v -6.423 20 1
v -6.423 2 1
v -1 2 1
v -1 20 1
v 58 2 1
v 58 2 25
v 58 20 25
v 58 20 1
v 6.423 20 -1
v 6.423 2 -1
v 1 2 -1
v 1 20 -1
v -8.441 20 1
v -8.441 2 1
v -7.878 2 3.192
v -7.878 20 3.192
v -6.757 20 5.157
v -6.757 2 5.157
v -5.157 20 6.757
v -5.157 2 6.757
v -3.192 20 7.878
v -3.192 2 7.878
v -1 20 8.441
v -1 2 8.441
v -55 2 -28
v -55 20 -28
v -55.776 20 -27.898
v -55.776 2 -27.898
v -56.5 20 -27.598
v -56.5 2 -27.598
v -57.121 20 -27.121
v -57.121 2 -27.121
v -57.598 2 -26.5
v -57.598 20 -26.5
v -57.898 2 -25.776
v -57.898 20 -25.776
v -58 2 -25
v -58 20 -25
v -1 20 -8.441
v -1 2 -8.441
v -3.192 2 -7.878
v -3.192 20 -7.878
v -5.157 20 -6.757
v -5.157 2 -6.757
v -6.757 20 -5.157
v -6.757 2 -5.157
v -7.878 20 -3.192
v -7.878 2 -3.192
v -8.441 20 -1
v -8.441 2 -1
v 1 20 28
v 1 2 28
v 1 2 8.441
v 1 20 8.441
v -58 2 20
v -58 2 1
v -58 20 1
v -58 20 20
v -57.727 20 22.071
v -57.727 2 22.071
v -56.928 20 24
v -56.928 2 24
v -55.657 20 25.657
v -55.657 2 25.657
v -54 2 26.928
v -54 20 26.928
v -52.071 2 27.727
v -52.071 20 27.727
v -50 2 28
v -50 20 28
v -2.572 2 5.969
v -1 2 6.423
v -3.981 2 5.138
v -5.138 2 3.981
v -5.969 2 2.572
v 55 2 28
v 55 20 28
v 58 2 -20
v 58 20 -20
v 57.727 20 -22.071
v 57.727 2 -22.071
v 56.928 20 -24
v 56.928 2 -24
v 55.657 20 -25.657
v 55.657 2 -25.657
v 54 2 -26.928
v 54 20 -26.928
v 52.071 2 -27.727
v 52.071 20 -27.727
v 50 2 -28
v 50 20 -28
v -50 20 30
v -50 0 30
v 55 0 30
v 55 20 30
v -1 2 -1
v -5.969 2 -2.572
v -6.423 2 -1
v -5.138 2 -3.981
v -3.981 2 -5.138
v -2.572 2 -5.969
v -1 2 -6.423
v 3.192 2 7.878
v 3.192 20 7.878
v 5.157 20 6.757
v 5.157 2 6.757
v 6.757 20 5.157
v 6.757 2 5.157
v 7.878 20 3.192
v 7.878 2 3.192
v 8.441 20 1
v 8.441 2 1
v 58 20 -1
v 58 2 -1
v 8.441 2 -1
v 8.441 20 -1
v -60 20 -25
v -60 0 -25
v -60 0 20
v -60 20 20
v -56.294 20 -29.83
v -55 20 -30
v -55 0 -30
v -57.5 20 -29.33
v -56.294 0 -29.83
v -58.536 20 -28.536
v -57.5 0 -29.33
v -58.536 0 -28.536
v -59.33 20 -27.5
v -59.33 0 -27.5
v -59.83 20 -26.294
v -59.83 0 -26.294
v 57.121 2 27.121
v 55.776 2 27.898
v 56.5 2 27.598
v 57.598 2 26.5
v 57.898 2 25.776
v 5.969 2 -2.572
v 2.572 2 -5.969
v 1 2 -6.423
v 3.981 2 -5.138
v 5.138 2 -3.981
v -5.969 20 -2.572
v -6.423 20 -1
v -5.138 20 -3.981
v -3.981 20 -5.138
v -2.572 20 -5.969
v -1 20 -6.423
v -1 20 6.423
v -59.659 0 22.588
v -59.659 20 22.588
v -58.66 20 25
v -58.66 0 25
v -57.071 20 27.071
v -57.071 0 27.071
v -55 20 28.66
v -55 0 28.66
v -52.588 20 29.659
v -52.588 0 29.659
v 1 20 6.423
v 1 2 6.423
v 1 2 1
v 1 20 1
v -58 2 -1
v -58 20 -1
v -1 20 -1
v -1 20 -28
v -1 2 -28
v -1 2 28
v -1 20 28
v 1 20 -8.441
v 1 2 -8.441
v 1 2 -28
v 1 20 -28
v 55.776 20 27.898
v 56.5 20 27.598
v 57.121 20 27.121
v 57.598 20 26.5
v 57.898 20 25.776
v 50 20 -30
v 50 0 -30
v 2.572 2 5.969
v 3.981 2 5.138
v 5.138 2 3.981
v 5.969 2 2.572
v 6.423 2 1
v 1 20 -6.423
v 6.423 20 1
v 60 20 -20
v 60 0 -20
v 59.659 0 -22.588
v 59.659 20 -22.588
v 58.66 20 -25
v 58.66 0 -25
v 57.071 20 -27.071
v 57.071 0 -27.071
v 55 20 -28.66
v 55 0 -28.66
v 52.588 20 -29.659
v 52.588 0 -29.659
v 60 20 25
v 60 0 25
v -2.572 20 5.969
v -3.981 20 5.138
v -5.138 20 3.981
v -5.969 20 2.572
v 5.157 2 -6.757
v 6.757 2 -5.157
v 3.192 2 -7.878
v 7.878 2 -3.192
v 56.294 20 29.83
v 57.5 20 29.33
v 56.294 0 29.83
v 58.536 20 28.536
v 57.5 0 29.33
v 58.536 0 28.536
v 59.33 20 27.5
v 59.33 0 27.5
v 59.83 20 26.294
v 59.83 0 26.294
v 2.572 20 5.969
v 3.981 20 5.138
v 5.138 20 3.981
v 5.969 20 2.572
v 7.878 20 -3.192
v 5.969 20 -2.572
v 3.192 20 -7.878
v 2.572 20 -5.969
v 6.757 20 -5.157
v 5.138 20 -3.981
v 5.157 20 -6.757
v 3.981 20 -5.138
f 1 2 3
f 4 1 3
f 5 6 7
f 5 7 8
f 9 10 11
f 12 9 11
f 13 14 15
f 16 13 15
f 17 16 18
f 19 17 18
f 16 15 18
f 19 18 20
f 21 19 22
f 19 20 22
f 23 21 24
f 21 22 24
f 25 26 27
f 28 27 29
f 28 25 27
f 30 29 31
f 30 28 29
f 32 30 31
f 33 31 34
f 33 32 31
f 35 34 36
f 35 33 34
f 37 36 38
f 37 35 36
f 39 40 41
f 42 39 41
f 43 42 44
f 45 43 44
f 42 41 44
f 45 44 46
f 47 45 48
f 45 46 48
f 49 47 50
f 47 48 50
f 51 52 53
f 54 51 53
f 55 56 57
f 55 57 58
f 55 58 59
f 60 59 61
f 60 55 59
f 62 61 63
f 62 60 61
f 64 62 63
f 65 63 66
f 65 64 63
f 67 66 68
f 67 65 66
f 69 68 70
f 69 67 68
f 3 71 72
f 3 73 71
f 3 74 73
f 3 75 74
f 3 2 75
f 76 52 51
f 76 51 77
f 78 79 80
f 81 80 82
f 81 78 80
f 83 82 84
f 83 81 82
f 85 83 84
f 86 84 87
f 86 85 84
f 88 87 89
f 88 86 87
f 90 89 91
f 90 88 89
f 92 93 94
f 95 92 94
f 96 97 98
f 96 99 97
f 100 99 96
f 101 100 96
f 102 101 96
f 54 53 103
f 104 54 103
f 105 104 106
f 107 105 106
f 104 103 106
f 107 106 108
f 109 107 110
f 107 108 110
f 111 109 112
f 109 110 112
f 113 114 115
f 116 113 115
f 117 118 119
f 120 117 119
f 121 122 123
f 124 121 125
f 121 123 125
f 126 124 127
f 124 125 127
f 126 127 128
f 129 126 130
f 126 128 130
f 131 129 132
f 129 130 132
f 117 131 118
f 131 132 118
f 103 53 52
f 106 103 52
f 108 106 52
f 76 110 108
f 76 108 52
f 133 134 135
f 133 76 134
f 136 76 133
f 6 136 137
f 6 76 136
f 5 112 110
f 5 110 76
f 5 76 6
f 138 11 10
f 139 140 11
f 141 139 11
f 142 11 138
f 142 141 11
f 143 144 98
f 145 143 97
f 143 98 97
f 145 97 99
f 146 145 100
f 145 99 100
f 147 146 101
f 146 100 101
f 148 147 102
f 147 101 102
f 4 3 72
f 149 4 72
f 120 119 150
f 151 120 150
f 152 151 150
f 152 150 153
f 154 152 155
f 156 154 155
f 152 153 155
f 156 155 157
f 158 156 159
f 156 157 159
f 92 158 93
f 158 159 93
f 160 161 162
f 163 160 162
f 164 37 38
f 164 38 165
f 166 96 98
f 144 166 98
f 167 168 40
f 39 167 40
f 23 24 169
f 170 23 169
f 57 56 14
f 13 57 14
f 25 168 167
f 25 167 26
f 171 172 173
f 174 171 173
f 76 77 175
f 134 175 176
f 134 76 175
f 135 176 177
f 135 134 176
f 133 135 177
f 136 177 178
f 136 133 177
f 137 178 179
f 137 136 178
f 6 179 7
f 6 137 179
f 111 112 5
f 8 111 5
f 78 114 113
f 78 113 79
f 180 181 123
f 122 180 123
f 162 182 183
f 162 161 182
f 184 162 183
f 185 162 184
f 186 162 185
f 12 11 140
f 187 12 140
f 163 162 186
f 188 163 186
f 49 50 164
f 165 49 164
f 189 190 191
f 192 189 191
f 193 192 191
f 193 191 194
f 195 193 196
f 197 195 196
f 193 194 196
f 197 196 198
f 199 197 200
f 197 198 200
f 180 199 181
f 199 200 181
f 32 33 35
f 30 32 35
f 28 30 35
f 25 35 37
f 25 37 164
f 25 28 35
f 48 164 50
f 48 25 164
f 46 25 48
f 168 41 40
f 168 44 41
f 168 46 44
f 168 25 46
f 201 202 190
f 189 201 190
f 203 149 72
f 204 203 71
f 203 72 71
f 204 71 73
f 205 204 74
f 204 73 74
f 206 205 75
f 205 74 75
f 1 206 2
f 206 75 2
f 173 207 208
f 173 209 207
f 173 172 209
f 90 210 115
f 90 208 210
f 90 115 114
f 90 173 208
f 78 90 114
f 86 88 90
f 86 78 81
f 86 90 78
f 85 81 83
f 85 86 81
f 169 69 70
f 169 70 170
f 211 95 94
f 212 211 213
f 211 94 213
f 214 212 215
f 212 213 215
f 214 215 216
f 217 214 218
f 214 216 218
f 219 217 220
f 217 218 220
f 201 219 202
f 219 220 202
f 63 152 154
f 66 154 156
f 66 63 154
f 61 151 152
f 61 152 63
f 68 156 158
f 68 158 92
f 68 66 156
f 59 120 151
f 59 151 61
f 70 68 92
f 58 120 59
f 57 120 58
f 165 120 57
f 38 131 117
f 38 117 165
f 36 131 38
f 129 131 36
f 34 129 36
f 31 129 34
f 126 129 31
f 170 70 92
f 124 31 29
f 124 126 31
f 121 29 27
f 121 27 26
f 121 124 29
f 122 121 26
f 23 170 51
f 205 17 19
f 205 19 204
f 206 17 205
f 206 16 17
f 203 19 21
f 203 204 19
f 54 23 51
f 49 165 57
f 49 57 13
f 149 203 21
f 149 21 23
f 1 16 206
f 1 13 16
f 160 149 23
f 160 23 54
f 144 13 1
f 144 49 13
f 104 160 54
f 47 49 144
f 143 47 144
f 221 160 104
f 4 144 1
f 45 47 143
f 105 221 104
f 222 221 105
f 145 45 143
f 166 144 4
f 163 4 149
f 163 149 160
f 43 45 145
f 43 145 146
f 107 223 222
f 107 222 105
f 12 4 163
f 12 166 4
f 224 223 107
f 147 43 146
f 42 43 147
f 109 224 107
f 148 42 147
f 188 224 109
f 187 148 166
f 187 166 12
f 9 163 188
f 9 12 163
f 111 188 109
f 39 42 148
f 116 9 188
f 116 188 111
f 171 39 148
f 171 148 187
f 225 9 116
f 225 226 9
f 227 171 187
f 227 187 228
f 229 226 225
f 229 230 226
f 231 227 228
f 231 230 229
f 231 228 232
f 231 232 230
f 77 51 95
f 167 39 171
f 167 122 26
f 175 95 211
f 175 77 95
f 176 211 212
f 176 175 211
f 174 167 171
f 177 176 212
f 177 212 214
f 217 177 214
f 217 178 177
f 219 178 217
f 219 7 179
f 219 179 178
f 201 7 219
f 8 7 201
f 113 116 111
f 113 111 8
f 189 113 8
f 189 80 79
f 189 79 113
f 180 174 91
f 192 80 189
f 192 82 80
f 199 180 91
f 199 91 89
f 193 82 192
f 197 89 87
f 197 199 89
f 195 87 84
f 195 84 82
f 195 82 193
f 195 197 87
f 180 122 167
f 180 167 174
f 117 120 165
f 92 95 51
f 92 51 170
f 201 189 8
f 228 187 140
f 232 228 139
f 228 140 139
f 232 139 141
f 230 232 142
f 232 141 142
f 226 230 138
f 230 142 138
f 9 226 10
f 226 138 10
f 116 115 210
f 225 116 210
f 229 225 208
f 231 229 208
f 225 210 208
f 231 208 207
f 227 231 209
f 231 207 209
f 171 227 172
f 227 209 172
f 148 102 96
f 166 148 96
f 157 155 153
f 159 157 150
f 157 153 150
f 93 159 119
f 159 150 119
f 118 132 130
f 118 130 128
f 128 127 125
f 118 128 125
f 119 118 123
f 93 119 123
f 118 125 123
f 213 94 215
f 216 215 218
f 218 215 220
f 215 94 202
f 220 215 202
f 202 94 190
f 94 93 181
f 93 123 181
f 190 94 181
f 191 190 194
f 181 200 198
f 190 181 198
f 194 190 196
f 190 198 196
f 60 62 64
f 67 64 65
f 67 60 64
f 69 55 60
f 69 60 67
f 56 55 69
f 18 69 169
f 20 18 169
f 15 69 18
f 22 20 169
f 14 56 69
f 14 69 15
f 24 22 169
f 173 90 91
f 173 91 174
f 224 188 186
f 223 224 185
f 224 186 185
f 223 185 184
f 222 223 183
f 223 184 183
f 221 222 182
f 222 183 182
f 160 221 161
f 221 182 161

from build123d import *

# Parameters (mm, degrees)
BOSS_EXTRUDE1_DEPTH = 20
SHELL1_T            = -2
RIB1_START          = -18
RIB1_DEPTH          = 18


# Read off the part's stored shape, not the designer's step: Rib1
with BuildPart() as part:
    # Sketch1 → Boss-Extrude1 (new body)
    with BuildSketch(Plane(origin=(0, 0, 0), x_dir=(1, 0, 0), z_dir=(0, 1, 0))):
        with BuildLine():
            Line((50, 30), (-55, 30))
            ThreePointArc((-55, 30), (-58.535533906, 28.535533906), (-60, 25))
            Line((-60, 25), (-60, -20))
            ThreePointArc((-60, -20), (-57.071067812, -27.071067812), (-50, -30))
            Line((-50, -30), (55, -30))
            ThreePointArc((55, -30), (58.535533906, -28.535533906), (60, -25))
            Line((60, -25), (60, 20))
            ThreePointArc((60, 20), (57.071067812, 27.071067812), (50, 30))
        make_face()
    extrude(amount=BOSS_EXTRUDE1_DEPTH)

    # Shell1
    shell1_openings = [part.faces().sort_by_distance(p)[0] for p in [
        (0, 20, 0),
    ]]
    offset(amount=SHELL1_T, openings=shell1_openings, kind=Kind.INTERSECTION)

    # Rib1 outline → Rib1 (add)
    with BuildSketch(Plane(origin=(0, 20, 0), x_dir=(1, 0, 0), z_dir=(0, 1, 0)).offset(RIB1_START)):
        with BuildLine():
            ThreePointArc((-1, 8.440971508), (-6.01040764, 6.01040764), (-8.440971508, 1))
            Line((-8.440971508, 1), (-58, 1))
            Line((-58, 1), (-58, -1))
            Line((-58, -1), (-8.440971508, -1))
            ThreePointArc((-8.440971508, -1), (-6.01040764, -6.01040764), (-1, -8.440971508))
            Line((-1, -8.440971508), (-1, -28))
            Line((-1, -28), (1, -28))
            Line((1, -28), (1, -8.440971508))
            ThreePointArc((1, -8.440971508), (6.01040764, -6.01040764), (8.440971508, -1))
            Line((8.440971508, -1), (58, -1))
            Line((58, -1), (58, 1))
            Line((58, 1), (8.440971508, 1))
            ThreePointArc((8.440971508, 1), (6.01040764, 6.01040764), (1, 8.440971508))
            Line((1, 8.440971508), (1, 28))
            Line((1, 28), (-1, 28))
            Line((-1, 28), (-1, 8.440971508))
        make_face()
        with BuildLine():
            Line((-1, -1), (-1, -6.422616289))
            ThreePointArc((-1, -6.422616289), (-4.596194078, -4.596194078), (-6.422616289, -1))
            Line((-6.422616289, -1), (-1, -1))
        make_face(mode=Mode.SUBTRACT)
        with BuildLine():
            Line((1, -1), (6.422616289, -1))
            ThreePointArc((6.422616289, -1), (4.596194078, -4.596194078), (1, -6.422616289))
            Line((1, -6.422616289), (1, -1))
        make_face(mode=Mode.SUBTRACT)
        with BuildLine():
            Line((-1, 1), (-6.422616289, 1))
            ThreePointArc((-6.422616289, 1), (-4.596194078, 4.596194078), (-1, 6.422616289))
            Line((-1, 6.422616289), (-1, 1))
        make_face(mode=Mode.SUBTRACT)
        with BuildLine():
            Line((1, 1), (1, 6.422616289))
            ThreePointArc((1, 6.422616289), (4.596194078, 4.596194078), (6.422616289, 1))
            Line((6.422616289, 1), (1, 1))
        make_face(mode=Mode.SUBTRACT)
    extrude(amount=RIB1_DEPTH)


solid = part.part
